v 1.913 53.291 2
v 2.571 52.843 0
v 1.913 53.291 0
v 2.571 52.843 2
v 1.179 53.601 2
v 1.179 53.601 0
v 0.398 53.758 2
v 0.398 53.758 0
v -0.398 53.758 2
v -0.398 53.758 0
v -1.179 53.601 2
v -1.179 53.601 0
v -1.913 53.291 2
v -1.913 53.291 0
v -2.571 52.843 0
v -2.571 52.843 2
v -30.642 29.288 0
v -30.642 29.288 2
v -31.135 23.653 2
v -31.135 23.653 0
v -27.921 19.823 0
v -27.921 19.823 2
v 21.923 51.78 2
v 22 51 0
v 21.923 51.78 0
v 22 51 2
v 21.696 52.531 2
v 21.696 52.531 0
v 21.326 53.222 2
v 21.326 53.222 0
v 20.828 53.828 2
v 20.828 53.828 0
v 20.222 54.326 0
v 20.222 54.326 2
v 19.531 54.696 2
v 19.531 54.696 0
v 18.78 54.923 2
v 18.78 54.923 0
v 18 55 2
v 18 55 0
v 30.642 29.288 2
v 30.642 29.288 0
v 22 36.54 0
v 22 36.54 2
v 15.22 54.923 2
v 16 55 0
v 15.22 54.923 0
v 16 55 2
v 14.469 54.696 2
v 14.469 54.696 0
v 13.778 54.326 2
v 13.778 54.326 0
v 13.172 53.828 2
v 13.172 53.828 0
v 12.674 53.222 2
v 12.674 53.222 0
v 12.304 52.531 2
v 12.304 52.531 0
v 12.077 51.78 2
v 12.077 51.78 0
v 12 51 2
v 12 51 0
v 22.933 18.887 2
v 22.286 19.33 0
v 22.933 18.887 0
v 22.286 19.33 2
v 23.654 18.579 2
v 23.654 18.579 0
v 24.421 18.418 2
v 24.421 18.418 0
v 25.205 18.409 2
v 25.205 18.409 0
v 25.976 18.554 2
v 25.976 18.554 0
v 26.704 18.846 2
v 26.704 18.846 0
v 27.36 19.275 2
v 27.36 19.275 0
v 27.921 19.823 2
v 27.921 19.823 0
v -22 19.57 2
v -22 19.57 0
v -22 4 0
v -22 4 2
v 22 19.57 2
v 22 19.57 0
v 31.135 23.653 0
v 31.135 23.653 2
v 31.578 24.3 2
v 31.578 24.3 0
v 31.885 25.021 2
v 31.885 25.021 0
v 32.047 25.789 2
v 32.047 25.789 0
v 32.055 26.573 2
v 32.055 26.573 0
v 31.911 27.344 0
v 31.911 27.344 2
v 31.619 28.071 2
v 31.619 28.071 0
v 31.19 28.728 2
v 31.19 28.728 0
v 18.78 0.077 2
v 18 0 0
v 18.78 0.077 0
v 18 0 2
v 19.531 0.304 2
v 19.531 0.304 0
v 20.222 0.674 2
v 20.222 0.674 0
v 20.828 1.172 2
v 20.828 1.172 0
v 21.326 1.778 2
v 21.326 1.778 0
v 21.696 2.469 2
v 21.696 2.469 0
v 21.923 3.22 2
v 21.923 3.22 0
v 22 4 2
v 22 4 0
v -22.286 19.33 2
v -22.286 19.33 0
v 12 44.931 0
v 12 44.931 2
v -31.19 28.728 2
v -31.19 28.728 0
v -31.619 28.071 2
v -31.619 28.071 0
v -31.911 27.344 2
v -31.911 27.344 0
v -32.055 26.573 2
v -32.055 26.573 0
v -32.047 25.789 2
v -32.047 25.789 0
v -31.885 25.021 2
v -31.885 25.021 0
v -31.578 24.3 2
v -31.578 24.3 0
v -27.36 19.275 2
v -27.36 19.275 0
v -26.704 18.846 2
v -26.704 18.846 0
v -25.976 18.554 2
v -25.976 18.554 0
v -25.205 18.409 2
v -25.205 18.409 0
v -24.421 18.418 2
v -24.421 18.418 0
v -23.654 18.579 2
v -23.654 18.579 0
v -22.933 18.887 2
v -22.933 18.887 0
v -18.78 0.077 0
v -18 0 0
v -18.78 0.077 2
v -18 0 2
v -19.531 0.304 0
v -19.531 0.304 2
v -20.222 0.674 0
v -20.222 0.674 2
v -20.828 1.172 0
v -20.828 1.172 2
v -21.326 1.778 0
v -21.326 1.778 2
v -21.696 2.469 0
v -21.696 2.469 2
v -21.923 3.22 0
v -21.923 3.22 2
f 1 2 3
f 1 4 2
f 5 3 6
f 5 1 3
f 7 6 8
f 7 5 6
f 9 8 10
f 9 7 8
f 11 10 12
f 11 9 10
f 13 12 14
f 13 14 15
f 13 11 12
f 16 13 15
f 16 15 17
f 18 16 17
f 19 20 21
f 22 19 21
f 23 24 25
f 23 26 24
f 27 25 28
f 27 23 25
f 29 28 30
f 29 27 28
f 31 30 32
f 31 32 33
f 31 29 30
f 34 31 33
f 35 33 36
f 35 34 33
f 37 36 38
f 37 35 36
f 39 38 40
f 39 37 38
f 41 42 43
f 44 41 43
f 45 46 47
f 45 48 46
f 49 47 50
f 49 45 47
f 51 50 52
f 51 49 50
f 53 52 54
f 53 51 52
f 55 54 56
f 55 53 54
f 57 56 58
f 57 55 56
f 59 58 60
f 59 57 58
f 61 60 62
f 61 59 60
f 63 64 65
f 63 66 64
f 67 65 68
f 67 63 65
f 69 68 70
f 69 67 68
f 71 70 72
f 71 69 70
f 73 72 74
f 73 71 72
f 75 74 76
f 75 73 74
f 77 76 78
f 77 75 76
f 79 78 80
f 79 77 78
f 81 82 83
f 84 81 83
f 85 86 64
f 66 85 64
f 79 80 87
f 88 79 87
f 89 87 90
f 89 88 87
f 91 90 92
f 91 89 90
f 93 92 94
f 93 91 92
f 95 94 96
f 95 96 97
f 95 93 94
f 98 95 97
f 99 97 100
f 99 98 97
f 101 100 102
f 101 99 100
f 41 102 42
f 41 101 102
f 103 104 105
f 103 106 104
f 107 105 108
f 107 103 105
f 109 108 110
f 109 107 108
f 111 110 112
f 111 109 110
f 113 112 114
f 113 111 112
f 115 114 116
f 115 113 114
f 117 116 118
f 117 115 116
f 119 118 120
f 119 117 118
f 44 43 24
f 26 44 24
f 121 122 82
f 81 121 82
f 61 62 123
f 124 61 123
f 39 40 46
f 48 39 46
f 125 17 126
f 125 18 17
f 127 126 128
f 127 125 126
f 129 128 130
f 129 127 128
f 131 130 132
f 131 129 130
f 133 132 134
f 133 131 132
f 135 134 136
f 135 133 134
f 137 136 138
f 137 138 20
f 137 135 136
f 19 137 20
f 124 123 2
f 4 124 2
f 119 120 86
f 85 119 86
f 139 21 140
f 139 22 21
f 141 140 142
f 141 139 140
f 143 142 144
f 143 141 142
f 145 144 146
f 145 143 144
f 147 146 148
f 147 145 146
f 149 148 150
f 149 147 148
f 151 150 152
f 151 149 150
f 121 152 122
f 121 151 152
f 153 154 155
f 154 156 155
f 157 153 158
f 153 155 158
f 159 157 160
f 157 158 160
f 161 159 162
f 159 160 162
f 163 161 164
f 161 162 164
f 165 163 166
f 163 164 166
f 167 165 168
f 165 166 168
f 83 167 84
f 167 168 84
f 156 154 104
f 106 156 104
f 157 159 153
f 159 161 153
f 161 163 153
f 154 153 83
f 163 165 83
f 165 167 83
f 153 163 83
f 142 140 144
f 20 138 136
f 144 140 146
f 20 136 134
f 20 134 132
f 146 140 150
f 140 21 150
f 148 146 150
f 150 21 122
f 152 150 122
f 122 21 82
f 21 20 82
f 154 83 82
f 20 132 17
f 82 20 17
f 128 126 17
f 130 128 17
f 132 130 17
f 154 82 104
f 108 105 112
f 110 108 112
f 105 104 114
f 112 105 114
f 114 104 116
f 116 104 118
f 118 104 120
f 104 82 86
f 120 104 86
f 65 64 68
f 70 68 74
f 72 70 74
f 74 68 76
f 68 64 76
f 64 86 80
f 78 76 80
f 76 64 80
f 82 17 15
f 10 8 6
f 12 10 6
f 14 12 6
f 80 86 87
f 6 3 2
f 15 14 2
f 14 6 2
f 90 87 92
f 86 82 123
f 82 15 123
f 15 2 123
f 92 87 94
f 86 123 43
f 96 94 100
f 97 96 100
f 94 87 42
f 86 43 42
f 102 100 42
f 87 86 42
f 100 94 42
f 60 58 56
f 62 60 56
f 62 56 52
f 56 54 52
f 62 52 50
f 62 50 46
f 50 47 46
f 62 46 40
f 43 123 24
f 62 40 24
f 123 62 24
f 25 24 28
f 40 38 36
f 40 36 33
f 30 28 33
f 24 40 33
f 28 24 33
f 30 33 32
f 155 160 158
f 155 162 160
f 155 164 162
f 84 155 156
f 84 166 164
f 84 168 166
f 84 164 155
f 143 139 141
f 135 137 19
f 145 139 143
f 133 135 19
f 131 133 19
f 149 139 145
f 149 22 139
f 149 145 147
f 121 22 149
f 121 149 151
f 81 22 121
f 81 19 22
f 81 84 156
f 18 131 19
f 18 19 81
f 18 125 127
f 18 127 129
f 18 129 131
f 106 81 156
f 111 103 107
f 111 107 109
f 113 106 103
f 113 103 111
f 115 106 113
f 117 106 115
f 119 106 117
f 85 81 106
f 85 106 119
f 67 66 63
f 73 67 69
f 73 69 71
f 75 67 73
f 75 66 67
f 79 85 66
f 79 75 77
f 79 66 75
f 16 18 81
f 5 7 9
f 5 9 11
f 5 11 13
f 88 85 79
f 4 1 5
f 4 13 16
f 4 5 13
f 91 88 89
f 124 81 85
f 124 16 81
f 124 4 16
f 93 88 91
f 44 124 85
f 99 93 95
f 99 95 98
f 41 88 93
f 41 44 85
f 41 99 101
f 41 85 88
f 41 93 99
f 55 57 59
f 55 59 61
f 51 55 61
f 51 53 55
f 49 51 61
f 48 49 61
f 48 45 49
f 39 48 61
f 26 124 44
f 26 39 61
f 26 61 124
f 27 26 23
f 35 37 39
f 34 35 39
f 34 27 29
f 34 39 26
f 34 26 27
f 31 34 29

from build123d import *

# Parameters (mm, degrees)
PAD_DEPTH = 2
FILLET_R  = 4


with BuildPart() as part:
    # Sketch → Pad (new body)
    with BuildSketch(Plane.XY):
        Polygon((-22, 0), (22, 0), (22, 19.569513), (25.349717, 16.758767), (33.705955, 26.717345), (22, 36.539808), (22, 55), (12, 55), (12, 44.930804), (0, 55), (-33.705955, 26.717345), (-25.349717, 16.758767), (-22, 19.569513), align=None)
    extrude(amount=PAD_DEPTH)

    # Fillet
    fillet_edges = [part.edges().sort_by_distance(p)[0] for p in [
        (22, 0, 1),
        (25.349717, 16.758767, 1),
        (33.705955, 26.717345, 1),
        (12, 55, 1),
        (22, 55, 1),
        (0, 55, 1),
        (-33.705955, 26.717345, 1),
        (-25.349717, 16.758767, 1),
        (-22, 0, 1),
    ]]
    fillet(fillet_edges, radius=FILLET_R)


solid = part.part
